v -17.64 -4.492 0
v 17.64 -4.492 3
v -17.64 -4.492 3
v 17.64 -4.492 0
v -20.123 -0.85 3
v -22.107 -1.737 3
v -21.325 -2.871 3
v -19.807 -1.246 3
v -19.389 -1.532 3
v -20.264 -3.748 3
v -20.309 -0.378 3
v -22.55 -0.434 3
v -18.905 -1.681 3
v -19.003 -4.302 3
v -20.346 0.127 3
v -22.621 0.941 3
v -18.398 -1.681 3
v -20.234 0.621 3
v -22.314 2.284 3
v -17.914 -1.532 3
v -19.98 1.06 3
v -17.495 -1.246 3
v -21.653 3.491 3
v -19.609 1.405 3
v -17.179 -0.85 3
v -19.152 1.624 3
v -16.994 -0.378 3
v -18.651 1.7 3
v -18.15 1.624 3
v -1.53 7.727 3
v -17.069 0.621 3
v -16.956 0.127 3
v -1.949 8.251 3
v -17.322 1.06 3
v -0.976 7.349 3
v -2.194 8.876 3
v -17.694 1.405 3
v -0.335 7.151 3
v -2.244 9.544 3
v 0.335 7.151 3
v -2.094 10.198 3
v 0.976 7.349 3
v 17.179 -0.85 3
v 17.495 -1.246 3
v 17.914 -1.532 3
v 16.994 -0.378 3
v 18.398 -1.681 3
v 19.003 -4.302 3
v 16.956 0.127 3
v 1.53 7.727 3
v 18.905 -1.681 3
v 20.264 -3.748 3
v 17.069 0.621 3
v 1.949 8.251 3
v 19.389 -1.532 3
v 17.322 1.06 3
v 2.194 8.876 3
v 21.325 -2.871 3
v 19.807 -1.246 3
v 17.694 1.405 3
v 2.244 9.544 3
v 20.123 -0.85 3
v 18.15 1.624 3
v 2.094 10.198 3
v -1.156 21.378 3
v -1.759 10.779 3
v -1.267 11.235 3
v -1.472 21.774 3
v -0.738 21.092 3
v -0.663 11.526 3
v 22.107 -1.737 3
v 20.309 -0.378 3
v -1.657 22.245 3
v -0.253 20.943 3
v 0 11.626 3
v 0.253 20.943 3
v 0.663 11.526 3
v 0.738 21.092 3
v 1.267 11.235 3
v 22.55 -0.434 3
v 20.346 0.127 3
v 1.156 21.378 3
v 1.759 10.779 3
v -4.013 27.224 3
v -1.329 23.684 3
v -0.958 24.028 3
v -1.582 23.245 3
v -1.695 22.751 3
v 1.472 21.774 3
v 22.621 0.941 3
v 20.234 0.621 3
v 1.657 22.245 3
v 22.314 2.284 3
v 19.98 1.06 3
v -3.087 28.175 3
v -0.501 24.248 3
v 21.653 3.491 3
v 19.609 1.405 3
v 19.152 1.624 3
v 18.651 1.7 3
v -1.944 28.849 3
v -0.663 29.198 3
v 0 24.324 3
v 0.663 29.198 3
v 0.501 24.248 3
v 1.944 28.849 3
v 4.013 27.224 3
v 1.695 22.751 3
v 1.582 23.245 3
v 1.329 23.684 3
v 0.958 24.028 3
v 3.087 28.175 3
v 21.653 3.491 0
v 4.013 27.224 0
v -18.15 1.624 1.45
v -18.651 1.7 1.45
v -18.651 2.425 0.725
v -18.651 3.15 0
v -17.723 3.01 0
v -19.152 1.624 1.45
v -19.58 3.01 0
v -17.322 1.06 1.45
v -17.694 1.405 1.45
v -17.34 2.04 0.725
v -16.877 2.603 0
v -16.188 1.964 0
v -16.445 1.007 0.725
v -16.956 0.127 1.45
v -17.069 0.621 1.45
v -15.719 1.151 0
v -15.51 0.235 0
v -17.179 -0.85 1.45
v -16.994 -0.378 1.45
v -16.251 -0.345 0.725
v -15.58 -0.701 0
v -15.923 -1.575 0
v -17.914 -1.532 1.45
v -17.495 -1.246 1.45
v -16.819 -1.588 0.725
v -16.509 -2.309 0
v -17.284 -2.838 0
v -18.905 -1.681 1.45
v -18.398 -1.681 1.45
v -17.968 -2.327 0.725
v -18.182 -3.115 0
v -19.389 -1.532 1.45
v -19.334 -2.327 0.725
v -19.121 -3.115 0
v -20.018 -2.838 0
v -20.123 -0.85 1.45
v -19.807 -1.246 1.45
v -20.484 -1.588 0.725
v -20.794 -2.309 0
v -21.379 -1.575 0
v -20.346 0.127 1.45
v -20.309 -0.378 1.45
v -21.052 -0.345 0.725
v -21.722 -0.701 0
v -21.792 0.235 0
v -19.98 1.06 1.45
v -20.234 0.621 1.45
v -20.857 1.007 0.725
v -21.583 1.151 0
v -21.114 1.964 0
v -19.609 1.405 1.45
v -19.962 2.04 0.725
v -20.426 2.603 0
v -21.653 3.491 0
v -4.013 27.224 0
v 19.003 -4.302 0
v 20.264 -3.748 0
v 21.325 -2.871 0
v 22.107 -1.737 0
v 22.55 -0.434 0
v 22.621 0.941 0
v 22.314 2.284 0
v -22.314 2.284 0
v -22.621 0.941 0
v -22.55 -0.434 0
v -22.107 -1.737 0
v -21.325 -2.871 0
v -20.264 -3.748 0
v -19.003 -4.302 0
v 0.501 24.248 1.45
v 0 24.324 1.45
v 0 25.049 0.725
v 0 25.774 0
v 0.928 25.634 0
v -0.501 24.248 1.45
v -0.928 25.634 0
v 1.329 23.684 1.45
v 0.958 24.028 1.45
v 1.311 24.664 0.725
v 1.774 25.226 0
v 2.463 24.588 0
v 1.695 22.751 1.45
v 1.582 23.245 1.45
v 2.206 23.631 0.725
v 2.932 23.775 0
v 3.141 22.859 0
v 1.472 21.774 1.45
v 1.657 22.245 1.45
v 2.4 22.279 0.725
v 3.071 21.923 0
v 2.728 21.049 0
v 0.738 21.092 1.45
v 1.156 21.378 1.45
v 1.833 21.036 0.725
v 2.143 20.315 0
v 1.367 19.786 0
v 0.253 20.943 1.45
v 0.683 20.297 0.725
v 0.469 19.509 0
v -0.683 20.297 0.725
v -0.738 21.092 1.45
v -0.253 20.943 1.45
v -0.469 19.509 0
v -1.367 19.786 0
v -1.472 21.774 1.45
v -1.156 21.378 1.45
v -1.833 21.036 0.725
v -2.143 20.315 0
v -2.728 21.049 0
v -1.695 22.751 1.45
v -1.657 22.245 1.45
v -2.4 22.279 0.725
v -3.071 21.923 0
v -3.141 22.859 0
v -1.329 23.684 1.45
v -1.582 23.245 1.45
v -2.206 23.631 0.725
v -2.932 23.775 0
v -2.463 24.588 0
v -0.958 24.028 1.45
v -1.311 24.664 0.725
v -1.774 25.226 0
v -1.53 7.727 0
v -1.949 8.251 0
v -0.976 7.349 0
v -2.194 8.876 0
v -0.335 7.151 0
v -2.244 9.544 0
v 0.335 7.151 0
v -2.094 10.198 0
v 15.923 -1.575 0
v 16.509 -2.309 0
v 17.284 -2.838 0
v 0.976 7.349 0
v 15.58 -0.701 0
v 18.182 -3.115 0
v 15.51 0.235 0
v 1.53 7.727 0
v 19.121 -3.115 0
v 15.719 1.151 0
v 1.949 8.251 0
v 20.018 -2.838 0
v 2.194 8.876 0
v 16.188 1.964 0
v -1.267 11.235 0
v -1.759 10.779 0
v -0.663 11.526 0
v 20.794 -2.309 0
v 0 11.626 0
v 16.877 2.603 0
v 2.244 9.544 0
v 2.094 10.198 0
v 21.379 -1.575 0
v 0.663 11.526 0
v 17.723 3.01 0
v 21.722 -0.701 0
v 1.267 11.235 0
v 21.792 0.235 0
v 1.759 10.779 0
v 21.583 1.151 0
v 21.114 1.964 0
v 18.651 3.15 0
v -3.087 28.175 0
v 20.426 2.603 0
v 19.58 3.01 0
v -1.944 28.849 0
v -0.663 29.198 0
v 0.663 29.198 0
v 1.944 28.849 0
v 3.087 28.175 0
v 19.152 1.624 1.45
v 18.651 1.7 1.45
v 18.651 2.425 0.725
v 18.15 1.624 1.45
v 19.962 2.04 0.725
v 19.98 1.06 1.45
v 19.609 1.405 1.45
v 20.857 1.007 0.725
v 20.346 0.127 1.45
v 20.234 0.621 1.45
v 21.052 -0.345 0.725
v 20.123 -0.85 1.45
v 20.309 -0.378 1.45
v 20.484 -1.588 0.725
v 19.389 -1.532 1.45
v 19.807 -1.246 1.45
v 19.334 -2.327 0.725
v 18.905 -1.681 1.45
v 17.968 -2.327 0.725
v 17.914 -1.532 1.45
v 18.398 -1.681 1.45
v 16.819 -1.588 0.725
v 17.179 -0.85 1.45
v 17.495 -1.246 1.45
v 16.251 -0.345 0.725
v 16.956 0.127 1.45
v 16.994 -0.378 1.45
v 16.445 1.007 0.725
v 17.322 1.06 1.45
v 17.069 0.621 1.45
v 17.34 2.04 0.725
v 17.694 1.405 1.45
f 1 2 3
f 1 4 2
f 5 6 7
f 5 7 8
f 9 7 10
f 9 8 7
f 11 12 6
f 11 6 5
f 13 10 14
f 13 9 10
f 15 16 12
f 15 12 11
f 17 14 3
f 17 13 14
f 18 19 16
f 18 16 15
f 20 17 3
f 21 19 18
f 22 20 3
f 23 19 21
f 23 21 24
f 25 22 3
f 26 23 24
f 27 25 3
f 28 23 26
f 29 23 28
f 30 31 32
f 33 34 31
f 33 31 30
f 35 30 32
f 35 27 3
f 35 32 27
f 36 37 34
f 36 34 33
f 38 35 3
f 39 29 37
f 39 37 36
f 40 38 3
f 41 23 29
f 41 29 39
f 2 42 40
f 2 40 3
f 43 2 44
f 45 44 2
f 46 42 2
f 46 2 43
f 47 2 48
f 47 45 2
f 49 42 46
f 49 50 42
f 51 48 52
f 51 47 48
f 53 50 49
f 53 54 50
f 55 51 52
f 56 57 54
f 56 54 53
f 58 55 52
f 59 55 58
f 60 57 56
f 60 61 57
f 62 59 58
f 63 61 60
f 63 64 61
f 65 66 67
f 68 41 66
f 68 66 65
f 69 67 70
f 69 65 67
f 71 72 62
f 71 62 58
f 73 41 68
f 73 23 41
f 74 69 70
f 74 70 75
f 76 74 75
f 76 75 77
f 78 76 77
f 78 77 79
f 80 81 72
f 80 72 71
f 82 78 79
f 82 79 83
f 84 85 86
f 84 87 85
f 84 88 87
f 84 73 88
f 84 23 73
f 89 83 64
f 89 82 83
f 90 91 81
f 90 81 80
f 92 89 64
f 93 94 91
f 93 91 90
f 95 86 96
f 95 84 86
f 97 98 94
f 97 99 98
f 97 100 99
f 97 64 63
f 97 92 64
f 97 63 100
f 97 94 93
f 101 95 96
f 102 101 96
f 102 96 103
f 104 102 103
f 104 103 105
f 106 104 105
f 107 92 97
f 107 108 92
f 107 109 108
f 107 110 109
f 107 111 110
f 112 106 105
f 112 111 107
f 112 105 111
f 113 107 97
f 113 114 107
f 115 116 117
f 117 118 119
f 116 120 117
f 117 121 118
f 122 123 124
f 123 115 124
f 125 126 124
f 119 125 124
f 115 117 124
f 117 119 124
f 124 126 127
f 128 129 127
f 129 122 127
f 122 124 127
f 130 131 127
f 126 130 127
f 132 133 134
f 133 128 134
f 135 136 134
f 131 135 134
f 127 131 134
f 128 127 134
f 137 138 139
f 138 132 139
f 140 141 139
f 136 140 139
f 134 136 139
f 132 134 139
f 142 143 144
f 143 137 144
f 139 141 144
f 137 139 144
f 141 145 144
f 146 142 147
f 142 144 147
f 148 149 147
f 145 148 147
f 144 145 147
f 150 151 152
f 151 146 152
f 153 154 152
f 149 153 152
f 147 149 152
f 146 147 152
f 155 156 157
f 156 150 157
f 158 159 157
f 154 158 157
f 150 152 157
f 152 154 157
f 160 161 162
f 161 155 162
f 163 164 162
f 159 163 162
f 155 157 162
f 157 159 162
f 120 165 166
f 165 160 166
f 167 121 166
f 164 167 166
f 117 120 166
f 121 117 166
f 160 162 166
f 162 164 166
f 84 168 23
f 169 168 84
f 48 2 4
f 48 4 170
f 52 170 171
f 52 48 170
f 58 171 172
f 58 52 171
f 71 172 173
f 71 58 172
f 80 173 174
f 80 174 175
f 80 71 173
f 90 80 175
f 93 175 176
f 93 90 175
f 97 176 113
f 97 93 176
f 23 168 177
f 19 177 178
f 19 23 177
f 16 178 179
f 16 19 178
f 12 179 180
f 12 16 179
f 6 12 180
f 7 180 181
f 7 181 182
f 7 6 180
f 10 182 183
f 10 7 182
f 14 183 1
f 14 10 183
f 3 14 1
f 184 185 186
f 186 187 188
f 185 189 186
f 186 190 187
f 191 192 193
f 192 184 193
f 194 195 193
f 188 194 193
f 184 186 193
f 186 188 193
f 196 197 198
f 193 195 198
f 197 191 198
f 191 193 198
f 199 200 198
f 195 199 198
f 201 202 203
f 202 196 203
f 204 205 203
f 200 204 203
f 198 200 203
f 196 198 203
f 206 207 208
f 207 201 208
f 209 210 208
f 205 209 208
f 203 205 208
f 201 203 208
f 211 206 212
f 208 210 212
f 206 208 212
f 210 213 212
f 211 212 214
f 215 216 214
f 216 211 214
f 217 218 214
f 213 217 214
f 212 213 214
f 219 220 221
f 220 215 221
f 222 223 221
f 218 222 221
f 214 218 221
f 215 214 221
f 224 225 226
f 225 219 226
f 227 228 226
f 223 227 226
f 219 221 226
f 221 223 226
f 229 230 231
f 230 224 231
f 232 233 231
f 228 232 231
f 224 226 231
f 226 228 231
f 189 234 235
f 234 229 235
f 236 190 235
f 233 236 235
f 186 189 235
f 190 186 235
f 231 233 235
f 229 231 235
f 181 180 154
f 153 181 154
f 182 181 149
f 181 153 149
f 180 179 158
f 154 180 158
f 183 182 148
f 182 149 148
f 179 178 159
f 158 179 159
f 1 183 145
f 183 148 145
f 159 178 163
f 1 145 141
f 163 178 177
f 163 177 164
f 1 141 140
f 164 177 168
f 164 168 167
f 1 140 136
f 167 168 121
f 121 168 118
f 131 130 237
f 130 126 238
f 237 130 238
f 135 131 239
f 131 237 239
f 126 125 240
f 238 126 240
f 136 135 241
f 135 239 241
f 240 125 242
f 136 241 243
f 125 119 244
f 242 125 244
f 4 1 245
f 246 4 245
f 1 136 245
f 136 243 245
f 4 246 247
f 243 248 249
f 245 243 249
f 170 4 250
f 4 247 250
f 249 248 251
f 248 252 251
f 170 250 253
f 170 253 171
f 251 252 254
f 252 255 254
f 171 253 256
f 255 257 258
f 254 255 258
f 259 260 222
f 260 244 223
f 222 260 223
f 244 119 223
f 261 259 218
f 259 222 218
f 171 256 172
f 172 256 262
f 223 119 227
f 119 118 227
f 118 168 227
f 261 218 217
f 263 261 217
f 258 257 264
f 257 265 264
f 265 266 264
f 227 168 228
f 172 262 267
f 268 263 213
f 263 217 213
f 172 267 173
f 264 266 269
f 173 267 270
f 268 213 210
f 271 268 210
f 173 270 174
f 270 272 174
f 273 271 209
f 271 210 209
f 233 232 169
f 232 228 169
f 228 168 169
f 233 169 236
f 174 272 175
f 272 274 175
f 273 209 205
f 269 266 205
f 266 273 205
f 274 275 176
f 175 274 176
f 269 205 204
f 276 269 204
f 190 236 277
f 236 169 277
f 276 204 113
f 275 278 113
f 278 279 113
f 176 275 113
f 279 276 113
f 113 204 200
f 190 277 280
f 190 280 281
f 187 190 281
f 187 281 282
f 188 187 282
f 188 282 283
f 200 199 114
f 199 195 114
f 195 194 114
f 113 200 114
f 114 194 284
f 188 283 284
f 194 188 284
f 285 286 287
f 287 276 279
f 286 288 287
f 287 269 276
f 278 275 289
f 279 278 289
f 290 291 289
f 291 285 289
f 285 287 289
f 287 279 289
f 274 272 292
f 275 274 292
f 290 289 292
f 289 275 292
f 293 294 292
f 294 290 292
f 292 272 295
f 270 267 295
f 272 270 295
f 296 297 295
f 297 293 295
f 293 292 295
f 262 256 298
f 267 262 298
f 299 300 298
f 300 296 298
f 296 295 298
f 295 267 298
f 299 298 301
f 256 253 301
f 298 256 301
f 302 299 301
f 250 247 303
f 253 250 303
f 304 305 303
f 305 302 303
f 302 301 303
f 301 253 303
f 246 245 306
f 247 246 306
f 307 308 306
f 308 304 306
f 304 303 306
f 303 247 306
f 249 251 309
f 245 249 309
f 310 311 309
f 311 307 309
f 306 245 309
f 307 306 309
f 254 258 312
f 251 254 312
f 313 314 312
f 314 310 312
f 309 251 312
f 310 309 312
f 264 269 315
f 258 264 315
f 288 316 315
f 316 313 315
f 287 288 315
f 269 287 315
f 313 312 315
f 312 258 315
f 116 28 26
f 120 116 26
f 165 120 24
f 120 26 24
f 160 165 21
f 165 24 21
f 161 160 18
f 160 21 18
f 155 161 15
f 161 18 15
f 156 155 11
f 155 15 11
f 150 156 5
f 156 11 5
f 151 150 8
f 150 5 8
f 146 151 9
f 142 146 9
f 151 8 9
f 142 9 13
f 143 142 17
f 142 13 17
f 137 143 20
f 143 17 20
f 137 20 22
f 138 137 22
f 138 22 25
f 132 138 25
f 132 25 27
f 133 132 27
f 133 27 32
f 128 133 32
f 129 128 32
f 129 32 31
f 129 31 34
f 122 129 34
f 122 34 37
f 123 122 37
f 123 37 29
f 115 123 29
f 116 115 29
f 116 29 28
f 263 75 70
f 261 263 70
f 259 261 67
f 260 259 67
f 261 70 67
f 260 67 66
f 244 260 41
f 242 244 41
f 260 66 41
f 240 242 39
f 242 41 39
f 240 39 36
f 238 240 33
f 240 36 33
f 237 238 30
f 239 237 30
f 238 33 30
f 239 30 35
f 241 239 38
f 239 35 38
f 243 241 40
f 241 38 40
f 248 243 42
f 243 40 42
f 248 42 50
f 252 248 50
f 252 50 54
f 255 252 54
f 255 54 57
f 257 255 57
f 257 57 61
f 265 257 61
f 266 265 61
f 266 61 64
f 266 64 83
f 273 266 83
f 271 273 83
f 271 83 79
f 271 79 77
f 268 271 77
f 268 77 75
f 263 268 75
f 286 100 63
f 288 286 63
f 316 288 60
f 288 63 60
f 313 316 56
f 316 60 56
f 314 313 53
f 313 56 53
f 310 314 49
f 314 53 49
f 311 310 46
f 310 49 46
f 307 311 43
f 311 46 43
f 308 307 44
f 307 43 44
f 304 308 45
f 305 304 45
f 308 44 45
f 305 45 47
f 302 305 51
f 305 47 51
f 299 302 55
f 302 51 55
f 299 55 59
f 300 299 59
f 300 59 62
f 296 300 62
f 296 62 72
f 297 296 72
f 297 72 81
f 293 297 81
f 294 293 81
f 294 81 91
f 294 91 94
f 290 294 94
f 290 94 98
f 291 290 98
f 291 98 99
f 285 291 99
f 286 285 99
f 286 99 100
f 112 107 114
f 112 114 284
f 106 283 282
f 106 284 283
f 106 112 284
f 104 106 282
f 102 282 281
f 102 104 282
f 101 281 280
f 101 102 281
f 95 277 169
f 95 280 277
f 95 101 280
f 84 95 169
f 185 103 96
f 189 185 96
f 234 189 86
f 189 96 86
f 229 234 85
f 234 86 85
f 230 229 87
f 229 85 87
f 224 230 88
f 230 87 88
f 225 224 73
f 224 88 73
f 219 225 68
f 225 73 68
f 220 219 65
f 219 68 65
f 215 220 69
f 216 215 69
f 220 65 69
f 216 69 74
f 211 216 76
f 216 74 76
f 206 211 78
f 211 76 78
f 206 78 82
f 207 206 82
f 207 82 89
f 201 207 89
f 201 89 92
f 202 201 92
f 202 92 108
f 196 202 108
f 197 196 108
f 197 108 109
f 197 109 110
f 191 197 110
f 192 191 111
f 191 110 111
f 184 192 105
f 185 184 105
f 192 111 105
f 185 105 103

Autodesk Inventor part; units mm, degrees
ref_plane "YZ Plane" through (0, 0, 0) normal (1, 0, 0) x (0, 1, 0)
ref_plane "XZ Plane" through (0, 0, 0) normal (0, 1, 0) x (-1, 0, 0)
ref_plane "XY Plane" through (0, 0, 0) normal (0, 0, 1) x (1, 0, 0)
sketch "Sketch1" plane through (0, 0, 0) normal (0, 0, 1) x (1, 0, 0)
  line L0 (18.6512, 0) -> (-18.6512, 0) construction
  line L1 (-27.5858, -4.4915) -> (0, 32.6237)
  line L2 (0, 32.6237) -> (27.5858, -4.4915)
  line L3 (27.5858, -4.4915) -> (-27.5858, -4.4915)
  line L4 (0, 32.6237) -> (0, 9.3762) construction
  line L5 (0, 9.3762) -> (-27.5858, -4.4915) construction
  line L6 (0, 9.3762) -> (27.5858, -4.4915) construction
  point P0 (0, 0)
  point P1 (0, 22.6237)
  point P2 (0, 0)
  dimension "d0" = 37.3025
  dimension "d1" = 22.6237
  dimension "d2" = 10
  dimension "d3" = 10
  dimension "d21" = 26.689
  dimension "d22" = 26.689
extrude "Extrusion1" add sketch "Sketch1" along normal blind 3
hole "Hole1" at (0, 22.6237, 0) at (18.6512, 0, 0) at (-18.6512, 0, 0) direction (0, 0, 1) diameter 3.4 depth 7 tip angle 118 countersink diameter 6.3 countersink angle 90 clearance for "Flat Head Machine Screw" size "M3" standard "Ansi Metric M Profile"
hole "Hole2" at (0, 9.3762, 0) direction (0, 0, 1) diameter 4.5 depth 7 tip angle 118 clearance for "Flat Head Machine Screw" size "M4" standard "Ansi Metric M Profile"
fillet "Fillet1" radius 5 3 edges at (0, 32.6237, 1.5) (27.5858, -4.4915, 1.5) (-27.5858, -4.4915, 1.5)
equation "\"d21\" = d22"
properties part number "Idle Ball Mount"
